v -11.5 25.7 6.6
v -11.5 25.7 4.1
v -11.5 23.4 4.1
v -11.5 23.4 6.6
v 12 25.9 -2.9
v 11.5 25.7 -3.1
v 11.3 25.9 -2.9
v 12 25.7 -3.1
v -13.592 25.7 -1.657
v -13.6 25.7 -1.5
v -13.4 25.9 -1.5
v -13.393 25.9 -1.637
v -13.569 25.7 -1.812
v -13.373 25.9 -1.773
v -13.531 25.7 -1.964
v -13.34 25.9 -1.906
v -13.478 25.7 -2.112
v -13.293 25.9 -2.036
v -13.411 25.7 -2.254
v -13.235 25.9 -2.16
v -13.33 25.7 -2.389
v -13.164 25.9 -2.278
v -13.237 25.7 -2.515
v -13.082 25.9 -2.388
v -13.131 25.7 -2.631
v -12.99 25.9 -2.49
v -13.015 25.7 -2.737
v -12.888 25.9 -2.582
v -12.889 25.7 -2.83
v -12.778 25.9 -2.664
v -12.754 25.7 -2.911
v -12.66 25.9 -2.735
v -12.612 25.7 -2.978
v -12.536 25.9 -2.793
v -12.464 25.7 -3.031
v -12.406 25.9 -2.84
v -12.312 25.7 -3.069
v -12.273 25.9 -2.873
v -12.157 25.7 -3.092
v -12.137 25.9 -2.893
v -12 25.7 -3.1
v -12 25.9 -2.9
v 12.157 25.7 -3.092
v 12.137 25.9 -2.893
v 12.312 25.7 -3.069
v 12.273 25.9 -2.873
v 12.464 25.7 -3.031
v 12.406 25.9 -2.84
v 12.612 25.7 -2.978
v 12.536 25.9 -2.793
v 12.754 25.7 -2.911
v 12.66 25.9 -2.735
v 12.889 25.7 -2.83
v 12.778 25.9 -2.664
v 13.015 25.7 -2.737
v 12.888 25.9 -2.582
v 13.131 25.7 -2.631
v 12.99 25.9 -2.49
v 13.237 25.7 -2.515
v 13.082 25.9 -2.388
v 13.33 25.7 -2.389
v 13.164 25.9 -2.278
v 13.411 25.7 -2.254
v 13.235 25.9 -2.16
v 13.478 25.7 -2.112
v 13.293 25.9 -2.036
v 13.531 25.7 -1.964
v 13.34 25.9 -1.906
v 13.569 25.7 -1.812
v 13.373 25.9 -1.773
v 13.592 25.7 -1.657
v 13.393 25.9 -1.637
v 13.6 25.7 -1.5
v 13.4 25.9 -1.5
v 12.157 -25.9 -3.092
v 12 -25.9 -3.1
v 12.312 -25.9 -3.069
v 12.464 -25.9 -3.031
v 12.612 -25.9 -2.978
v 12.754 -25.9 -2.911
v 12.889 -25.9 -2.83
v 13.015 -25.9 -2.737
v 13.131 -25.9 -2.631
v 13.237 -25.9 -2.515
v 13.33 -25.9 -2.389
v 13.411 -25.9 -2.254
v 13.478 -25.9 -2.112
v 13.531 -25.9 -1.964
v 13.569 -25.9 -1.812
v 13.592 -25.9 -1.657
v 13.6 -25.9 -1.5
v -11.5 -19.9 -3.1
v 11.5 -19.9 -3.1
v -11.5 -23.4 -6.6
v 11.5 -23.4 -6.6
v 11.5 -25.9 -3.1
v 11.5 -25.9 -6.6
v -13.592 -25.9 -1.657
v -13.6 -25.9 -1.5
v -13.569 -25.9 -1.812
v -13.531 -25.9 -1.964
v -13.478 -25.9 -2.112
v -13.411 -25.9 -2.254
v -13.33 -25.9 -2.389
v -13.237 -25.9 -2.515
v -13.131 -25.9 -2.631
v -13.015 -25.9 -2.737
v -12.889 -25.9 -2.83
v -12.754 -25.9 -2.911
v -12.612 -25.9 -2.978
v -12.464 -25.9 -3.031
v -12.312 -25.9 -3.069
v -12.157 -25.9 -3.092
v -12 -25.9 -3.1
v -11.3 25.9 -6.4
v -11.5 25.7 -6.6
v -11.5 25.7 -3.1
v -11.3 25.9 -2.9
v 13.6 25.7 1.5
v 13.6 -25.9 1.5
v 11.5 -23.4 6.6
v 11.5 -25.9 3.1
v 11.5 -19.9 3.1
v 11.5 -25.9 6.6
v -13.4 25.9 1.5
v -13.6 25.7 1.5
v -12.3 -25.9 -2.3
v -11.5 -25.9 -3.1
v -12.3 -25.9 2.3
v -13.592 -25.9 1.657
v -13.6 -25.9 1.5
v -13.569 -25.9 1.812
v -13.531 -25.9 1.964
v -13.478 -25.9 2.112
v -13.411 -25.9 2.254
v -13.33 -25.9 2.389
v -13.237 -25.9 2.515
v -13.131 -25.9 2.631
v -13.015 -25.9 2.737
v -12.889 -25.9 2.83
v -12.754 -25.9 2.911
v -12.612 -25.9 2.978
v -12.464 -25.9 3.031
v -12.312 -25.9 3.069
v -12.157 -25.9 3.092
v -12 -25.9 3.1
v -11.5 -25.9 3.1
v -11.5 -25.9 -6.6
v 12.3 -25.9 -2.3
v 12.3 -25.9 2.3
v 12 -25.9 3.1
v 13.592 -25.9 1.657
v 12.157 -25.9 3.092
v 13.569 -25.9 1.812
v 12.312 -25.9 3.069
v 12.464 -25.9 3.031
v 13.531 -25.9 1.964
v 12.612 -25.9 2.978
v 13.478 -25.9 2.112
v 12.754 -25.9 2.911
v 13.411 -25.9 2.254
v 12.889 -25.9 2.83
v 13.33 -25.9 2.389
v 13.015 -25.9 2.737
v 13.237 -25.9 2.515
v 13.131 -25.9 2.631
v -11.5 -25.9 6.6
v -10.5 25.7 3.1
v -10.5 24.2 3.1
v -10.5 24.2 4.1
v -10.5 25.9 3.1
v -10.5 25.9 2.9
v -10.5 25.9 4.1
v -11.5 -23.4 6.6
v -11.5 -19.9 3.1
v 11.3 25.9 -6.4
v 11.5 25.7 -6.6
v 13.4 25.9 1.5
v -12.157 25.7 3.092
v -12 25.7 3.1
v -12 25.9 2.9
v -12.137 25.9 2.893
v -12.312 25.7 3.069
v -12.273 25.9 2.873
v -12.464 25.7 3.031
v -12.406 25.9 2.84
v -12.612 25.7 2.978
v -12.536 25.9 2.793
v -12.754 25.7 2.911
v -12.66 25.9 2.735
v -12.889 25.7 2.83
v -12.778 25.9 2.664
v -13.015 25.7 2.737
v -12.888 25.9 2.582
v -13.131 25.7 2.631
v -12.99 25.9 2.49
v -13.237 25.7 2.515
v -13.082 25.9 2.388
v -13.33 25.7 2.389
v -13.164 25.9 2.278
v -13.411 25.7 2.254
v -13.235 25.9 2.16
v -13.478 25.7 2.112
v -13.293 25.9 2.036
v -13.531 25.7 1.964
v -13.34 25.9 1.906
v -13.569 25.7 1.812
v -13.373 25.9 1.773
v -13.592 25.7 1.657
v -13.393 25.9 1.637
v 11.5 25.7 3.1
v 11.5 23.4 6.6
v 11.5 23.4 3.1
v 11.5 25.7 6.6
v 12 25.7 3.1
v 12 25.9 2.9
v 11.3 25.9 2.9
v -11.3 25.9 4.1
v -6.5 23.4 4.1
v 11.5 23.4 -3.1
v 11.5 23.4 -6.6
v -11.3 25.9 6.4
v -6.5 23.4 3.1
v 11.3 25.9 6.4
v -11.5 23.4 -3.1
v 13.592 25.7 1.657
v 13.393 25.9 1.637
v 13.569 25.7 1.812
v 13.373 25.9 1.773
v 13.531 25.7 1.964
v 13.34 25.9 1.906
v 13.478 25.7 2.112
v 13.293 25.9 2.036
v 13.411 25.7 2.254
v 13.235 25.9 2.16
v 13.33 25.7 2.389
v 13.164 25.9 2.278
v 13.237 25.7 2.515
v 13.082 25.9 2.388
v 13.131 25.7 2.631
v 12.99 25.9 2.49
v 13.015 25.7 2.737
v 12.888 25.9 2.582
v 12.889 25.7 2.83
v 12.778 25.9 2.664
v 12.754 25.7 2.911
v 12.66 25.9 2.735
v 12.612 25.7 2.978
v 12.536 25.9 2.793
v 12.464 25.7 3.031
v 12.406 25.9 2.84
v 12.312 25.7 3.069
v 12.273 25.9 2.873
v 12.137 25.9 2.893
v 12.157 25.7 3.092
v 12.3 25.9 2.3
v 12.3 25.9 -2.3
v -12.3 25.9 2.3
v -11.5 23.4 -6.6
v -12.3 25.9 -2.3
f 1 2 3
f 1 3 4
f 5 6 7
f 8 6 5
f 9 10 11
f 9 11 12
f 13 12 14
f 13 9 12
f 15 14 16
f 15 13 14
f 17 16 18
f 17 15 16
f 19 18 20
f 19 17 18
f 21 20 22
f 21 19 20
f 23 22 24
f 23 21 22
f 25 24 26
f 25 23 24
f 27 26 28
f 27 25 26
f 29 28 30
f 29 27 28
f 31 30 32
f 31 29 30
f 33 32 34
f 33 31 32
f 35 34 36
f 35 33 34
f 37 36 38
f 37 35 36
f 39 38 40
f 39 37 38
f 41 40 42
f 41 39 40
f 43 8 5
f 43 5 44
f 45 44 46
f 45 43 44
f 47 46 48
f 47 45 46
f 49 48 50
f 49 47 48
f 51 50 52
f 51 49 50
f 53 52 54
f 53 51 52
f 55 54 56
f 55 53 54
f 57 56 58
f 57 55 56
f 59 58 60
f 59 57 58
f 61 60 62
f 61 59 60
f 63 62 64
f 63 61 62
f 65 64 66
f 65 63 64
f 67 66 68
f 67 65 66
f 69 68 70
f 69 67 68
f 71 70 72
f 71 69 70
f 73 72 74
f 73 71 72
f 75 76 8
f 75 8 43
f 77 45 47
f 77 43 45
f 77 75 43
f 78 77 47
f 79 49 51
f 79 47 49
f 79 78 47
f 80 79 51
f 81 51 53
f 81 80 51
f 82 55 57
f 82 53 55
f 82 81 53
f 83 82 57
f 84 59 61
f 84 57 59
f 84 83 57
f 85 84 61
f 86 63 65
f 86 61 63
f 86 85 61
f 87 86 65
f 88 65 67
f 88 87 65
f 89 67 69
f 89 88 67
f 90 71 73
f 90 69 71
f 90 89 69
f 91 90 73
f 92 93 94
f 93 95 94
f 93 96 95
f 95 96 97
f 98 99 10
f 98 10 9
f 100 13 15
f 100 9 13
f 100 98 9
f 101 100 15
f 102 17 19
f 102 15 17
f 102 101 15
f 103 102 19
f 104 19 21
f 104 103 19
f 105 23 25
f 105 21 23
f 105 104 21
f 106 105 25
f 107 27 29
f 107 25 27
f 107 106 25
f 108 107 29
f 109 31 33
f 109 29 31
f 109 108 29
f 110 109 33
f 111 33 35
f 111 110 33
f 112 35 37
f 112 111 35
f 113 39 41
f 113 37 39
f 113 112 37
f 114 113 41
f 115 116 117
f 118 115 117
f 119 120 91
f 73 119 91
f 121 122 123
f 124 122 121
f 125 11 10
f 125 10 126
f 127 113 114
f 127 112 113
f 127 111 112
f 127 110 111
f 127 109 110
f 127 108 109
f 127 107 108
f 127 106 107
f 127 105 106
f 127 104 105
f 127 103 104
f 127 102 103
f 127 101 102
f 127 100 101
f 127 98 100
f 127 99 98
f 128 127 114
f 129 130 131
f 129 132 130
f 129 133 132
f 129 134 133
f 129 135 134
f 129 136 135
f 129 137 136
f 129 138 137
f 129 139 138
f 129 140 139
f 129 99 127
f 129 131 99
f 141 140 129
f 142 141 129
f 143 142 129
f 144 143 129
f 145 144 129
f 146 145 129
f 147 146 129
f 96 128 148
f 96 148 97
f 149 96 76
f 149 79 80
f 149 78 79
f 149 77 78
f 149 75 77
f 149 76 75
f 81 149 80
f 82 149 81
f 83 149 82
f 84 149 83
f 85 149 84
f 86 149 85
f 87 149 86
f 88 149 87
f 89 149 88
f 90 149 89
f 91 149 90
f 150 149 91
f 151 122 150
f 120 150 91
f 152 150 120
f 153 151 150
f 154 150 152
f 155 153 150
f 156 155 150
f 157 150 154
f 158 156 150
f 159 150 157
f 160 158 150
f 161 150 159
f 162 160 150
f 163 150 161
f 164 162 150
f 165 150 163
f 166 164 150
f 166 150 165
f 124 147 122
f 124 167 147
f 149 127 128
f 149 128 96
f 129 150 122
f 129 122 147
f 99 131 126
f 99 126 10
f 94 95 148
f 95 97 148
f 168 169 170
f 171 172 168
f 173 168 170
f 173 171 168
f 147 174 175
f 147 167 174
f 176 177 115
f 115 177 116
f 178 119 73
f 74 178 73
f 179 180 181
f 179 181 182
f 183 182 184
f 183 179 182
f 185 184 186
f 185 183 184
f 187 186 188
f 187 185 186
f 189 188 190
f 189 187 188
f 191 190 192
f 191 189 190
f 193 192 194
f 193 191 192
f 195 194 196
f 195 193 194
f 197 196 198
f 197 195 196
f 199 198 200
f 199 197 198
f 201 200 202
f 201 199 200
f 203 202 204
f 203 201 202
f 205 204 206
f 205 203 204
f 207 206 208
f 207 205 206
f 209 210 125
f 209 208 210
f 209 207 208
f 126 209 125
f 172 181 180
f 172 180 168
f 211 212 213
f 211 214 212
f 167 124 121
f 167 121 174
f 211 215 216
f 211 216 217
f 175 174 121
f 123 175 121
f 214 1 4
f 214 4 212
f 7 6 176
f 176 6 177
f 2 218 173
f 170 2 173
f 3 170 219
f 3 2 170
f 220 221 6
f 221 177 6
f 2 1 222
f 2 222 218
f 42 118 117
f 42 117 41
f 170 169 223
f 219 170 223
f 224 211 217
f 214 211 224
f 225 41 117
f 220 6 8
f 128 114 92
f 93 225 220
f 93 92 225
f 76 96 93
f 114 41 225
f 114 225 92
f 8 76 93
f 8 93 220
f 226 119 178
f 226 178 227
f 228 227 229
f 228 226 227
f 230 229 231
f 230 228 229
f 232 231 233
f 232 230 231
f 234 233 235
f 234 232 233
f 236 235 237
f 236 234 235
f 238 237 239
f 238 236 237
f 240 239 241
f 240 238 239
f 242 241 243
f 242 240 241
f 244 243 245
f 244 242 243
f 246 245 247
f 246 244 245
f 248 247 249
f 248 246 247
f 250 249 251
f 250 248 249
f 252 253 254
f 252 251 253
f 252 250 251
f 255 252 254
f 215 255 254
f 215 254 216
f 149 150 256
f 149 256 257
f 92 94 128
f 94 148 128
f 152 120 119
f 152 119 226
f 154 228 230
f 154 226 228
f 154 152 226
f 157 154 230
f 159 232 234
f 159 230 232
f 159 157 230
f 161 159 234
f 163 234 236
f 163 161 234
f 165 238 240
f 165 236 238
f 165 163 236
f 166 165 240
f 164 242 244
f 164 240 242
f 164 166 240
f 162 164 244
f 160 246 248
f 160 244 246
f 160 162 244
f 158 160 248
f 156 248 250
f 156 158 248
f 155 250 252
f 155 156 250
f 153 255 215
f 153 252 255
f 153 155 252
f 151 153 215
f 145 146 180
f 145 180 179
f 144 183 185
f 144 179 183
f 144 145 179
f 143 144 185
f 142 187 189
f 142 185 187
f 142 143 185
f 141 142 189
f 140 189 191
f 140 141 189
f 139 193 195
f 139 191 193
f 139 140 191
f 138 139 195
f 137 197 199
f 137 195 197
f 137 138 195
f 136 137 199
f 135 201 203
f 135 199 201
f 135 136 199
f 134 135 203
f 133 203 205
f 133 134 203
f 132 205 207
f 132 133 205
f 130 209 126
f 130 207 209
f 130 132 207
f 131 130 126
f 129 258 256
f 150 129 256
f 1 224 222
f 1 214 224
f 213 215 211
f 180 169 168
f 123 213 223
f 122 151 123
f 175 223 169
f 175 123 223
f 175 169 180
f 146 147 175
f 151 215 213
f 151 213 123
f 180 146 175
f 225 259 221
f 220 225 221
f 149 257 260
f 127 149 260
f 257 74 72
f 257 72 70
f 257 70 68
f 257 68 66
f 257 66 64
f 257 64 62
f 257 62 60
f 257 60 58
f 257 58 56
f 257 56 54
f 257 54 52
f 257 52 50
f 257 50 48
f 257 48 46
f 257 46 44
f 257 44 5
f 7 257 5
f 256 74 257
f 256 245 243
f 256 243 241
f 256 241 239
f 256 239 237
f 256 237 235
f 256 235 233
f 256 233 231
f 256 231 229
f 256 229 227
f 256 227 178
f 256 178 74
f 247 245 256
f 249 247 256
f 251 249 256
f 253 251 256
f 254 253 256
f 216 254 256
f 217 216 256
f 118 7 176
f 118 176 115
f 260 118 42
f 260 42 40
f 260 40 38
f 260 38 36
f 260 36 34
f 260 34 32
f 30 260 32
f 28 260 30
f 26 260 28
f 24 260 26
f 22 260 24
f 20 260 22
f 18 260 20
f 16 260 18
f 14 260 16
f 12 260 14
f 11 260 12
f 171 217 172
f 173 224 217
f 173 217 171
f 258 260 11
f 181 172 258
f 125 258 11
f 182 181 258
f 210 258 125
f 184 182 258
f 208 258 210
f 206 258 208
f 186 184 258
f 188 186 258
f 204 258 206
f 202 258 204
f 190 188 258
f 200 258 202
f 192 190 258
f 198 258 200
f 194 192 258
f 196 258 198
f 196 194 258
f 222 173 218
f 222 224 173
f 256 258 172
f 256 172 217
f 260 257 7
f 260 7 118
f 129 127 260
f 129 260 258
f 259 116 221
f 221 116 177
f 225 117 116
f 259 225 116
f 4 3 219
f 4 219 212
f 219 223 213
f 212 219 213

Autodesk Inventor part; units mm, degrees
ref_plane "YZ Plane" through (0, 0, 0) normal (1, 0, 0) x (0, 1, 0)
ref_plane "XZ Plane" through (0, 0, 0) normal (0, 1, 0) x (-1, 0, 0)
ref_plane "XY Plane" through (0, 0, 0) normal (0, 0, 1) x (1, 0, 0)
sketch "Skizze2" plane through (0, 0, 0) normal (0, 1, 0) x (-1, 0, 0)
  line L0 (-12.3, -2.3) -> (12.3, -2.3)
  line L1 (12.3, -2.3) -> (12.3, 2.3)
  line L2 (12.3, 2.3) -> (-12.3, 2.3)
  line L3 (-12.3, 2.3) -> (-12.3, -2.3)
  line L4 (-12.3, -2.3) -> (12.3, 2.3) construction
  line L5 (12.3, -2.3) -> (-12.3, 2.3) construction
  line L6 (-12, 3.1) -> (12, 3.1)
  line L7 (12, -3.1) -> (-12, -3.1)
  line L8 (-19.5039, 0) -> (19.5039, 0) projected
  line L9 (0, -4.8039) -> (0, 4.8039) projected
  arc A0 (-12, 3.1) -> (-13.6, 1.5) centre (-12, 1.5) ccw
  arc A1 (-13.6, -1.5) -> (-12, -3.1) centre (-12, -1.5) ccw
  arc A2 (13.6, 1.5) -> (12, 3.1) centre (12, 1.5) ccw
  arc A3 (12, -3.1) -> (13.6, -1.5) centre (12, -1.5) ccw
  line L10 (-13.6, 1.5) -> (-13.6, -1.5)
  line L11 (13.6, 1.5) -> (13.6, -1.5)
  point P0 (0, 0)
  dimension "d0" = 24.6
  dimension "d1" = 4.6
  dimension "d2" = 0.8
  dimension "d29" = 3.2
  dimension "d32" = 1.3
extrude "Extrusion1" add sketch "Skizze2" along normal blind 25.9 contours L0 L9 L7 A1 L10 L8 L3 | L0 L1 L8 L11 A3 L7 L9 | L8 L10 A0 L6 L9 L2 L3 | L1 L2 L9 L6 A2 L11 L8
sketch "Skizze3" plane through (0, 25.9, 0) normal (0, 1, 0) x (1, 0, 0)
  line L0 (12.3, 2.3) -> (12.3, -2.3) projected
  line L1 (12.3, -2.3) -> (-12.3, -2.3) projected
  line L2 (-12.3, -2.3) -> (-12.3, 2.3) projected
  line L3 (-12.3, 2.3) -> (12.3, 2.3) projected
  line L4 (12, 3.1) -> (-12, 3.1) projected
  line L5 (-12, -3.1) -> (12, -3.1) projected
  line L6 (19.0715, 0) -> (-19.0452, 0) projected
  line L7 (11.5, -3.1) -> (-11.5, -3.1)
  line L8 (-11.5, -3.1) -> (-11.5, -6.6)
  line L9 (-11.5, -6.6) -> (11.5, -6.6)
  line L10 (11.5, -6.6) -> (11.5, -3.1)
  line L11 (12, 3.1) -> (-12, 3.1) projected
  line L12 (11.5, 3.1) -> (-11.5, 3.1)
  line L13 (-11.5, 3.1) -> (-11.5, 6.6)
  line L14 (-11.5, 6.6) -> (11.5, 6.6)
  line L15 (11.5, 6.6) -> (11.5, 3.1)
  line L16 (0, 7.84) -> (0, -7.84) projected
  line L17 (-12, -3.1) -> (12, -3.1) projected
  arc A0 (12, -3.1) -> (13.6, -1.5) centre (12, -1.5) ccw projected
  arc A1 (13.6, 1.5) -> (12, 3.1) centre (12, 1.5) ccw projected
  arc A2 (-12, 3.1) -> (-13.6, 1.5) centre (-12, 1.5) ccw projected
  arc A3 (-13.6, -1.5) -> (-12, -3.1) centre (-12, -1.5) ccw projected
  line L18 (13.6, -1.5) -> (13.6, 1.5) projected
  line L19 (-13.6, 1.5) -> (-13.6, -1.5) projected
  dimension "d18" = 3.5
  dimension "d19" = 23
extrude "Extrusion2" add sketch "Skizze3" against normal blind 2.5 contours L16 L14 L15 L4 | L4 L13 L14 L16 | L16 L9 L8 L5 | L5 L10 L9 L16
mirror "Spiegeln1" about plane through (0, 0, 0) normal (0, 1, 0) of "Extrusion1", "Extrusion2"
chamfer "Fase1" distance 3.5 angle 45 2 edges at (0, -23.4, 3.1) (0, -23.4, -3.1)
sketch "Skizze7" plane through (0, 23.4, 0) normal (0, -1, 0) x (1, 0, 0)
  line L0 (13.4387, -2.2) -> (13.6, -2.2) projected
  line L1 (13.6, 1.5) -> (13.6, 2.2) projected
  line L2 (13.6, 2.2) -> (13.4387, 2.2) projected
  line L3 (11.5, 3.1) -> (11.5, 6.6) projected
  line L4 (11.5, 6.6) -> (-11.5, 6.6) projected
  line L5 (-11.5, 6.6) -> (-11.5, 3.1) projected
  line L6 (11.5, 3.1) -> (-11.5, 3.1) projected
  line L7 (-11.5, -3.1) -> (11.5, -3.1) projected
  line L8 (-11.5, -3.1) -> (-11.5, -6.6) projected
  line L9 (-11.5, -6.6) -> (11.5, -6.6) projected
  line L10 (11.5, -6.6) -> (11.5, -3.1) projected
  line L11 (-13.6, -2.2) -> (-13.4387, -2.2) projected
  line L12 (-13.4387, 2.2) -> (-13.6, 2.2) projected
  line L13 (-13.6, -1.5) -> (-13.6, -2.2) projected
  line L14 (-13.6, 2.2) -> (-13.6, 1.5) projected
  arc A0 (-13.6, -1.5) -> (-13.4387, -2.2) centre (-12, -1.5) ccw projected
  arc A1 (-13.4387, 2.2) -> (-13.6, 1.5) centre (-12, 1.5) ccw projected
  arc A2 (13.4387, -2.2) -> (13.6, -1.5) centre (12, -1.5) ccw projected
  line L15 (13.6, -2.2) -> (13.6, -1.5) projected
  arc A3 (13.6, 1.5) -> (13.4387, 2.2) centre (12, 1.5) ccw projected
extrude "Extrusion4" [suppressed]
chamfer "Fase2" [suppressed]
sketch "Skizze8" plane through (-11.5, 23.4, 3.1) normal (0, 0, 1) x (1, 0, 0)
  line L0 (0, 2.5) -> (23, 2.5) projected
  line L1 (0, 2.5) -> (0, 0) projected
  line L2 (23, 0) -> (0, 0) projected
  line L3 (23, 2.5) -> (23, 0) projected
  line L4 (0, 0) -> (23, 0) projected
  line L5 (0, 0) -> (0, 1)
  line L6 (0, 1) -> (5, 0)
  line L7 (5, 0) -> (0, 0)
  point P0 (11.5, -23.4)
  dimension "d33" = 1
  dimension "d34" = 5
extrude "Extrusion5" cut sketch "Skizze8" along normal blind 1 contours L6 L2 L1
sketch "Skizze9" plane through (-11.5, 25.9, 3.1) normal (-1, 0, 0) x (0, 0, 1)
  line L0 (0, -1.5) -> (1, -1.5) projected
  line L1 (1, -1.5) -> (1, -2.5) projected
  line L2 (3.5, -2.5) -> (1, -2.5) projected
  line L3 (3.5, 0) -> (3.5, -2.5) projected
  line L4 (0, 0) -> (3.5, 0) projected
  line L5 (0, -1.5) -> (0, 0) projected
  line L6 (1, -2.5) -> (0, -2.5)
  line L7 (0, -2.5) -> (0, 0)
  line L8 (0, 0) -> (1, 0)
  line L9 (1, 0) -> (1, -2.5)
  point P0 (-3.1, -25.9)
extrude "Extrusion6" cut sketch "Skizze9" against normal blind 1 contours L5 L4 L9 L0 | L0 L1 L6 L7
chamfer "Fase3" distance 0.2 angle 45 16 edges at (0, 25.9, 6.6) (11.5, 25.9, 4.85) (13.1314, 25.9, 2.6314) (13.6, 25.9, 0) (13.1314, 25.9, -2.6314) (11.75, 25.9, -3.1) (11.75, 25.9, 3.1) (11.5, 25.9, -4.85) (0, 25.9, -6.6) (-11.5, 25.9, -4.85) (-11.75, 25.9, -3.1) (-13.1314, 25.9, -2.6314) (-13.6, 25.9, 0) (-13.1314, 25.9, 2.6314) (-11.25, 25.9, 3.1) (-11.5, 25.9, 5.35)
properties part number "Spulenkoerper" material "PC/ABS-Kunststoff"
